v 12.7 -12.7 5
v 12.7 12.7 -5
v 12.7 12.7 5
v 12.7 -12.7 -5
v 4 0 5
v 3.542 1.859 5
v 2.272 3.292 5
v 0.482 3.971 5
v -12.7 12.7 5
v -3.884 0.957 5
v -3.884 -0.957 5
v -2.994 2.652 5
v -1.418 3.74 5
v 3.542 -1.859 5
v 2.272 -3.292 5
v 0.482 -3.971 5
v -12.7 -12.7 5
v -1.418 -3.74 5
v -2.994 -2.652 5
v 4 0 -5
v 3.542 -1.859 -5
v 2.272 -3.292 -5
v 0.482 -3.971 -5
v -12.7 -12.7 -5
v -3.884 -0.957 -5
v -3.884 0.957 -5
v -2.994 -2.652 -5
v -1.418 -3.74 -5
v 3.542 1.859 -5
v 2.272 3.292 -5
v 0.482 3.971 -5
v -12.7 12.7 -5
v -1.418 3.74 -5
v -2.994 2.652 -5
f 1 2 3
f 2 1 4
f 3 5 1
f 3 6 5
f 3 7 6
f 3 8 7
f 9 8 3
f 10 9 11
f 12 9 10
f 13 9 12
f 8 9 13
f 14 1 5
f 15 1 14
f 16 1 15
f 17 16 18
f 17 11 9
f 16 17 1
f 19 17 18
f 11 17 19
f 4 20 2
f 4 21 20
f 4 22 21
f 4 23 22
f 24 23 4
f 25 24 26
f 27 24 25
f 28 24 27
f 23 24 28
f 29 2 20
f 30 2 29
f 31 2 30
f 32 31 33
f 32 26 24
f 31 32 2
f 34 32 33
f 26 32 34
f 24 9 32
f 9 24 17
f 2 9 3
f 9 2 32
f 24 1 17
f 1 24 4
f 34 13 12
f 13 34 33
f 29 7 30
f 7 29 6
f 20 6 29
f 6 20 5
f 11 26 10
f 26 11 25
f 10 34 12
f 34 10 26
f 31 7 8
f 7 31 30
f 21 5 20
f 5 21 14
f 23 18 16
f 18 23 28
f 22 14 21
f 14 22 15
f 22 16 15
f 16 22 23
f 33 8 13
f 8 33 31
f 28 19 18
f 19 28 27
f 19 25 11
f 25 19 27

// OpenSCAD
// Side length
s=25.4;
//Thickness of holder
h=10;
// Hole radius
r=4;
// chamfer hole cylinder
c=0;

module base(){
    difference(){
        cube([s,s,h], center=true);
        cylinder(h, r-c, r, center=true);
    }
}

// execute entry point
base();
